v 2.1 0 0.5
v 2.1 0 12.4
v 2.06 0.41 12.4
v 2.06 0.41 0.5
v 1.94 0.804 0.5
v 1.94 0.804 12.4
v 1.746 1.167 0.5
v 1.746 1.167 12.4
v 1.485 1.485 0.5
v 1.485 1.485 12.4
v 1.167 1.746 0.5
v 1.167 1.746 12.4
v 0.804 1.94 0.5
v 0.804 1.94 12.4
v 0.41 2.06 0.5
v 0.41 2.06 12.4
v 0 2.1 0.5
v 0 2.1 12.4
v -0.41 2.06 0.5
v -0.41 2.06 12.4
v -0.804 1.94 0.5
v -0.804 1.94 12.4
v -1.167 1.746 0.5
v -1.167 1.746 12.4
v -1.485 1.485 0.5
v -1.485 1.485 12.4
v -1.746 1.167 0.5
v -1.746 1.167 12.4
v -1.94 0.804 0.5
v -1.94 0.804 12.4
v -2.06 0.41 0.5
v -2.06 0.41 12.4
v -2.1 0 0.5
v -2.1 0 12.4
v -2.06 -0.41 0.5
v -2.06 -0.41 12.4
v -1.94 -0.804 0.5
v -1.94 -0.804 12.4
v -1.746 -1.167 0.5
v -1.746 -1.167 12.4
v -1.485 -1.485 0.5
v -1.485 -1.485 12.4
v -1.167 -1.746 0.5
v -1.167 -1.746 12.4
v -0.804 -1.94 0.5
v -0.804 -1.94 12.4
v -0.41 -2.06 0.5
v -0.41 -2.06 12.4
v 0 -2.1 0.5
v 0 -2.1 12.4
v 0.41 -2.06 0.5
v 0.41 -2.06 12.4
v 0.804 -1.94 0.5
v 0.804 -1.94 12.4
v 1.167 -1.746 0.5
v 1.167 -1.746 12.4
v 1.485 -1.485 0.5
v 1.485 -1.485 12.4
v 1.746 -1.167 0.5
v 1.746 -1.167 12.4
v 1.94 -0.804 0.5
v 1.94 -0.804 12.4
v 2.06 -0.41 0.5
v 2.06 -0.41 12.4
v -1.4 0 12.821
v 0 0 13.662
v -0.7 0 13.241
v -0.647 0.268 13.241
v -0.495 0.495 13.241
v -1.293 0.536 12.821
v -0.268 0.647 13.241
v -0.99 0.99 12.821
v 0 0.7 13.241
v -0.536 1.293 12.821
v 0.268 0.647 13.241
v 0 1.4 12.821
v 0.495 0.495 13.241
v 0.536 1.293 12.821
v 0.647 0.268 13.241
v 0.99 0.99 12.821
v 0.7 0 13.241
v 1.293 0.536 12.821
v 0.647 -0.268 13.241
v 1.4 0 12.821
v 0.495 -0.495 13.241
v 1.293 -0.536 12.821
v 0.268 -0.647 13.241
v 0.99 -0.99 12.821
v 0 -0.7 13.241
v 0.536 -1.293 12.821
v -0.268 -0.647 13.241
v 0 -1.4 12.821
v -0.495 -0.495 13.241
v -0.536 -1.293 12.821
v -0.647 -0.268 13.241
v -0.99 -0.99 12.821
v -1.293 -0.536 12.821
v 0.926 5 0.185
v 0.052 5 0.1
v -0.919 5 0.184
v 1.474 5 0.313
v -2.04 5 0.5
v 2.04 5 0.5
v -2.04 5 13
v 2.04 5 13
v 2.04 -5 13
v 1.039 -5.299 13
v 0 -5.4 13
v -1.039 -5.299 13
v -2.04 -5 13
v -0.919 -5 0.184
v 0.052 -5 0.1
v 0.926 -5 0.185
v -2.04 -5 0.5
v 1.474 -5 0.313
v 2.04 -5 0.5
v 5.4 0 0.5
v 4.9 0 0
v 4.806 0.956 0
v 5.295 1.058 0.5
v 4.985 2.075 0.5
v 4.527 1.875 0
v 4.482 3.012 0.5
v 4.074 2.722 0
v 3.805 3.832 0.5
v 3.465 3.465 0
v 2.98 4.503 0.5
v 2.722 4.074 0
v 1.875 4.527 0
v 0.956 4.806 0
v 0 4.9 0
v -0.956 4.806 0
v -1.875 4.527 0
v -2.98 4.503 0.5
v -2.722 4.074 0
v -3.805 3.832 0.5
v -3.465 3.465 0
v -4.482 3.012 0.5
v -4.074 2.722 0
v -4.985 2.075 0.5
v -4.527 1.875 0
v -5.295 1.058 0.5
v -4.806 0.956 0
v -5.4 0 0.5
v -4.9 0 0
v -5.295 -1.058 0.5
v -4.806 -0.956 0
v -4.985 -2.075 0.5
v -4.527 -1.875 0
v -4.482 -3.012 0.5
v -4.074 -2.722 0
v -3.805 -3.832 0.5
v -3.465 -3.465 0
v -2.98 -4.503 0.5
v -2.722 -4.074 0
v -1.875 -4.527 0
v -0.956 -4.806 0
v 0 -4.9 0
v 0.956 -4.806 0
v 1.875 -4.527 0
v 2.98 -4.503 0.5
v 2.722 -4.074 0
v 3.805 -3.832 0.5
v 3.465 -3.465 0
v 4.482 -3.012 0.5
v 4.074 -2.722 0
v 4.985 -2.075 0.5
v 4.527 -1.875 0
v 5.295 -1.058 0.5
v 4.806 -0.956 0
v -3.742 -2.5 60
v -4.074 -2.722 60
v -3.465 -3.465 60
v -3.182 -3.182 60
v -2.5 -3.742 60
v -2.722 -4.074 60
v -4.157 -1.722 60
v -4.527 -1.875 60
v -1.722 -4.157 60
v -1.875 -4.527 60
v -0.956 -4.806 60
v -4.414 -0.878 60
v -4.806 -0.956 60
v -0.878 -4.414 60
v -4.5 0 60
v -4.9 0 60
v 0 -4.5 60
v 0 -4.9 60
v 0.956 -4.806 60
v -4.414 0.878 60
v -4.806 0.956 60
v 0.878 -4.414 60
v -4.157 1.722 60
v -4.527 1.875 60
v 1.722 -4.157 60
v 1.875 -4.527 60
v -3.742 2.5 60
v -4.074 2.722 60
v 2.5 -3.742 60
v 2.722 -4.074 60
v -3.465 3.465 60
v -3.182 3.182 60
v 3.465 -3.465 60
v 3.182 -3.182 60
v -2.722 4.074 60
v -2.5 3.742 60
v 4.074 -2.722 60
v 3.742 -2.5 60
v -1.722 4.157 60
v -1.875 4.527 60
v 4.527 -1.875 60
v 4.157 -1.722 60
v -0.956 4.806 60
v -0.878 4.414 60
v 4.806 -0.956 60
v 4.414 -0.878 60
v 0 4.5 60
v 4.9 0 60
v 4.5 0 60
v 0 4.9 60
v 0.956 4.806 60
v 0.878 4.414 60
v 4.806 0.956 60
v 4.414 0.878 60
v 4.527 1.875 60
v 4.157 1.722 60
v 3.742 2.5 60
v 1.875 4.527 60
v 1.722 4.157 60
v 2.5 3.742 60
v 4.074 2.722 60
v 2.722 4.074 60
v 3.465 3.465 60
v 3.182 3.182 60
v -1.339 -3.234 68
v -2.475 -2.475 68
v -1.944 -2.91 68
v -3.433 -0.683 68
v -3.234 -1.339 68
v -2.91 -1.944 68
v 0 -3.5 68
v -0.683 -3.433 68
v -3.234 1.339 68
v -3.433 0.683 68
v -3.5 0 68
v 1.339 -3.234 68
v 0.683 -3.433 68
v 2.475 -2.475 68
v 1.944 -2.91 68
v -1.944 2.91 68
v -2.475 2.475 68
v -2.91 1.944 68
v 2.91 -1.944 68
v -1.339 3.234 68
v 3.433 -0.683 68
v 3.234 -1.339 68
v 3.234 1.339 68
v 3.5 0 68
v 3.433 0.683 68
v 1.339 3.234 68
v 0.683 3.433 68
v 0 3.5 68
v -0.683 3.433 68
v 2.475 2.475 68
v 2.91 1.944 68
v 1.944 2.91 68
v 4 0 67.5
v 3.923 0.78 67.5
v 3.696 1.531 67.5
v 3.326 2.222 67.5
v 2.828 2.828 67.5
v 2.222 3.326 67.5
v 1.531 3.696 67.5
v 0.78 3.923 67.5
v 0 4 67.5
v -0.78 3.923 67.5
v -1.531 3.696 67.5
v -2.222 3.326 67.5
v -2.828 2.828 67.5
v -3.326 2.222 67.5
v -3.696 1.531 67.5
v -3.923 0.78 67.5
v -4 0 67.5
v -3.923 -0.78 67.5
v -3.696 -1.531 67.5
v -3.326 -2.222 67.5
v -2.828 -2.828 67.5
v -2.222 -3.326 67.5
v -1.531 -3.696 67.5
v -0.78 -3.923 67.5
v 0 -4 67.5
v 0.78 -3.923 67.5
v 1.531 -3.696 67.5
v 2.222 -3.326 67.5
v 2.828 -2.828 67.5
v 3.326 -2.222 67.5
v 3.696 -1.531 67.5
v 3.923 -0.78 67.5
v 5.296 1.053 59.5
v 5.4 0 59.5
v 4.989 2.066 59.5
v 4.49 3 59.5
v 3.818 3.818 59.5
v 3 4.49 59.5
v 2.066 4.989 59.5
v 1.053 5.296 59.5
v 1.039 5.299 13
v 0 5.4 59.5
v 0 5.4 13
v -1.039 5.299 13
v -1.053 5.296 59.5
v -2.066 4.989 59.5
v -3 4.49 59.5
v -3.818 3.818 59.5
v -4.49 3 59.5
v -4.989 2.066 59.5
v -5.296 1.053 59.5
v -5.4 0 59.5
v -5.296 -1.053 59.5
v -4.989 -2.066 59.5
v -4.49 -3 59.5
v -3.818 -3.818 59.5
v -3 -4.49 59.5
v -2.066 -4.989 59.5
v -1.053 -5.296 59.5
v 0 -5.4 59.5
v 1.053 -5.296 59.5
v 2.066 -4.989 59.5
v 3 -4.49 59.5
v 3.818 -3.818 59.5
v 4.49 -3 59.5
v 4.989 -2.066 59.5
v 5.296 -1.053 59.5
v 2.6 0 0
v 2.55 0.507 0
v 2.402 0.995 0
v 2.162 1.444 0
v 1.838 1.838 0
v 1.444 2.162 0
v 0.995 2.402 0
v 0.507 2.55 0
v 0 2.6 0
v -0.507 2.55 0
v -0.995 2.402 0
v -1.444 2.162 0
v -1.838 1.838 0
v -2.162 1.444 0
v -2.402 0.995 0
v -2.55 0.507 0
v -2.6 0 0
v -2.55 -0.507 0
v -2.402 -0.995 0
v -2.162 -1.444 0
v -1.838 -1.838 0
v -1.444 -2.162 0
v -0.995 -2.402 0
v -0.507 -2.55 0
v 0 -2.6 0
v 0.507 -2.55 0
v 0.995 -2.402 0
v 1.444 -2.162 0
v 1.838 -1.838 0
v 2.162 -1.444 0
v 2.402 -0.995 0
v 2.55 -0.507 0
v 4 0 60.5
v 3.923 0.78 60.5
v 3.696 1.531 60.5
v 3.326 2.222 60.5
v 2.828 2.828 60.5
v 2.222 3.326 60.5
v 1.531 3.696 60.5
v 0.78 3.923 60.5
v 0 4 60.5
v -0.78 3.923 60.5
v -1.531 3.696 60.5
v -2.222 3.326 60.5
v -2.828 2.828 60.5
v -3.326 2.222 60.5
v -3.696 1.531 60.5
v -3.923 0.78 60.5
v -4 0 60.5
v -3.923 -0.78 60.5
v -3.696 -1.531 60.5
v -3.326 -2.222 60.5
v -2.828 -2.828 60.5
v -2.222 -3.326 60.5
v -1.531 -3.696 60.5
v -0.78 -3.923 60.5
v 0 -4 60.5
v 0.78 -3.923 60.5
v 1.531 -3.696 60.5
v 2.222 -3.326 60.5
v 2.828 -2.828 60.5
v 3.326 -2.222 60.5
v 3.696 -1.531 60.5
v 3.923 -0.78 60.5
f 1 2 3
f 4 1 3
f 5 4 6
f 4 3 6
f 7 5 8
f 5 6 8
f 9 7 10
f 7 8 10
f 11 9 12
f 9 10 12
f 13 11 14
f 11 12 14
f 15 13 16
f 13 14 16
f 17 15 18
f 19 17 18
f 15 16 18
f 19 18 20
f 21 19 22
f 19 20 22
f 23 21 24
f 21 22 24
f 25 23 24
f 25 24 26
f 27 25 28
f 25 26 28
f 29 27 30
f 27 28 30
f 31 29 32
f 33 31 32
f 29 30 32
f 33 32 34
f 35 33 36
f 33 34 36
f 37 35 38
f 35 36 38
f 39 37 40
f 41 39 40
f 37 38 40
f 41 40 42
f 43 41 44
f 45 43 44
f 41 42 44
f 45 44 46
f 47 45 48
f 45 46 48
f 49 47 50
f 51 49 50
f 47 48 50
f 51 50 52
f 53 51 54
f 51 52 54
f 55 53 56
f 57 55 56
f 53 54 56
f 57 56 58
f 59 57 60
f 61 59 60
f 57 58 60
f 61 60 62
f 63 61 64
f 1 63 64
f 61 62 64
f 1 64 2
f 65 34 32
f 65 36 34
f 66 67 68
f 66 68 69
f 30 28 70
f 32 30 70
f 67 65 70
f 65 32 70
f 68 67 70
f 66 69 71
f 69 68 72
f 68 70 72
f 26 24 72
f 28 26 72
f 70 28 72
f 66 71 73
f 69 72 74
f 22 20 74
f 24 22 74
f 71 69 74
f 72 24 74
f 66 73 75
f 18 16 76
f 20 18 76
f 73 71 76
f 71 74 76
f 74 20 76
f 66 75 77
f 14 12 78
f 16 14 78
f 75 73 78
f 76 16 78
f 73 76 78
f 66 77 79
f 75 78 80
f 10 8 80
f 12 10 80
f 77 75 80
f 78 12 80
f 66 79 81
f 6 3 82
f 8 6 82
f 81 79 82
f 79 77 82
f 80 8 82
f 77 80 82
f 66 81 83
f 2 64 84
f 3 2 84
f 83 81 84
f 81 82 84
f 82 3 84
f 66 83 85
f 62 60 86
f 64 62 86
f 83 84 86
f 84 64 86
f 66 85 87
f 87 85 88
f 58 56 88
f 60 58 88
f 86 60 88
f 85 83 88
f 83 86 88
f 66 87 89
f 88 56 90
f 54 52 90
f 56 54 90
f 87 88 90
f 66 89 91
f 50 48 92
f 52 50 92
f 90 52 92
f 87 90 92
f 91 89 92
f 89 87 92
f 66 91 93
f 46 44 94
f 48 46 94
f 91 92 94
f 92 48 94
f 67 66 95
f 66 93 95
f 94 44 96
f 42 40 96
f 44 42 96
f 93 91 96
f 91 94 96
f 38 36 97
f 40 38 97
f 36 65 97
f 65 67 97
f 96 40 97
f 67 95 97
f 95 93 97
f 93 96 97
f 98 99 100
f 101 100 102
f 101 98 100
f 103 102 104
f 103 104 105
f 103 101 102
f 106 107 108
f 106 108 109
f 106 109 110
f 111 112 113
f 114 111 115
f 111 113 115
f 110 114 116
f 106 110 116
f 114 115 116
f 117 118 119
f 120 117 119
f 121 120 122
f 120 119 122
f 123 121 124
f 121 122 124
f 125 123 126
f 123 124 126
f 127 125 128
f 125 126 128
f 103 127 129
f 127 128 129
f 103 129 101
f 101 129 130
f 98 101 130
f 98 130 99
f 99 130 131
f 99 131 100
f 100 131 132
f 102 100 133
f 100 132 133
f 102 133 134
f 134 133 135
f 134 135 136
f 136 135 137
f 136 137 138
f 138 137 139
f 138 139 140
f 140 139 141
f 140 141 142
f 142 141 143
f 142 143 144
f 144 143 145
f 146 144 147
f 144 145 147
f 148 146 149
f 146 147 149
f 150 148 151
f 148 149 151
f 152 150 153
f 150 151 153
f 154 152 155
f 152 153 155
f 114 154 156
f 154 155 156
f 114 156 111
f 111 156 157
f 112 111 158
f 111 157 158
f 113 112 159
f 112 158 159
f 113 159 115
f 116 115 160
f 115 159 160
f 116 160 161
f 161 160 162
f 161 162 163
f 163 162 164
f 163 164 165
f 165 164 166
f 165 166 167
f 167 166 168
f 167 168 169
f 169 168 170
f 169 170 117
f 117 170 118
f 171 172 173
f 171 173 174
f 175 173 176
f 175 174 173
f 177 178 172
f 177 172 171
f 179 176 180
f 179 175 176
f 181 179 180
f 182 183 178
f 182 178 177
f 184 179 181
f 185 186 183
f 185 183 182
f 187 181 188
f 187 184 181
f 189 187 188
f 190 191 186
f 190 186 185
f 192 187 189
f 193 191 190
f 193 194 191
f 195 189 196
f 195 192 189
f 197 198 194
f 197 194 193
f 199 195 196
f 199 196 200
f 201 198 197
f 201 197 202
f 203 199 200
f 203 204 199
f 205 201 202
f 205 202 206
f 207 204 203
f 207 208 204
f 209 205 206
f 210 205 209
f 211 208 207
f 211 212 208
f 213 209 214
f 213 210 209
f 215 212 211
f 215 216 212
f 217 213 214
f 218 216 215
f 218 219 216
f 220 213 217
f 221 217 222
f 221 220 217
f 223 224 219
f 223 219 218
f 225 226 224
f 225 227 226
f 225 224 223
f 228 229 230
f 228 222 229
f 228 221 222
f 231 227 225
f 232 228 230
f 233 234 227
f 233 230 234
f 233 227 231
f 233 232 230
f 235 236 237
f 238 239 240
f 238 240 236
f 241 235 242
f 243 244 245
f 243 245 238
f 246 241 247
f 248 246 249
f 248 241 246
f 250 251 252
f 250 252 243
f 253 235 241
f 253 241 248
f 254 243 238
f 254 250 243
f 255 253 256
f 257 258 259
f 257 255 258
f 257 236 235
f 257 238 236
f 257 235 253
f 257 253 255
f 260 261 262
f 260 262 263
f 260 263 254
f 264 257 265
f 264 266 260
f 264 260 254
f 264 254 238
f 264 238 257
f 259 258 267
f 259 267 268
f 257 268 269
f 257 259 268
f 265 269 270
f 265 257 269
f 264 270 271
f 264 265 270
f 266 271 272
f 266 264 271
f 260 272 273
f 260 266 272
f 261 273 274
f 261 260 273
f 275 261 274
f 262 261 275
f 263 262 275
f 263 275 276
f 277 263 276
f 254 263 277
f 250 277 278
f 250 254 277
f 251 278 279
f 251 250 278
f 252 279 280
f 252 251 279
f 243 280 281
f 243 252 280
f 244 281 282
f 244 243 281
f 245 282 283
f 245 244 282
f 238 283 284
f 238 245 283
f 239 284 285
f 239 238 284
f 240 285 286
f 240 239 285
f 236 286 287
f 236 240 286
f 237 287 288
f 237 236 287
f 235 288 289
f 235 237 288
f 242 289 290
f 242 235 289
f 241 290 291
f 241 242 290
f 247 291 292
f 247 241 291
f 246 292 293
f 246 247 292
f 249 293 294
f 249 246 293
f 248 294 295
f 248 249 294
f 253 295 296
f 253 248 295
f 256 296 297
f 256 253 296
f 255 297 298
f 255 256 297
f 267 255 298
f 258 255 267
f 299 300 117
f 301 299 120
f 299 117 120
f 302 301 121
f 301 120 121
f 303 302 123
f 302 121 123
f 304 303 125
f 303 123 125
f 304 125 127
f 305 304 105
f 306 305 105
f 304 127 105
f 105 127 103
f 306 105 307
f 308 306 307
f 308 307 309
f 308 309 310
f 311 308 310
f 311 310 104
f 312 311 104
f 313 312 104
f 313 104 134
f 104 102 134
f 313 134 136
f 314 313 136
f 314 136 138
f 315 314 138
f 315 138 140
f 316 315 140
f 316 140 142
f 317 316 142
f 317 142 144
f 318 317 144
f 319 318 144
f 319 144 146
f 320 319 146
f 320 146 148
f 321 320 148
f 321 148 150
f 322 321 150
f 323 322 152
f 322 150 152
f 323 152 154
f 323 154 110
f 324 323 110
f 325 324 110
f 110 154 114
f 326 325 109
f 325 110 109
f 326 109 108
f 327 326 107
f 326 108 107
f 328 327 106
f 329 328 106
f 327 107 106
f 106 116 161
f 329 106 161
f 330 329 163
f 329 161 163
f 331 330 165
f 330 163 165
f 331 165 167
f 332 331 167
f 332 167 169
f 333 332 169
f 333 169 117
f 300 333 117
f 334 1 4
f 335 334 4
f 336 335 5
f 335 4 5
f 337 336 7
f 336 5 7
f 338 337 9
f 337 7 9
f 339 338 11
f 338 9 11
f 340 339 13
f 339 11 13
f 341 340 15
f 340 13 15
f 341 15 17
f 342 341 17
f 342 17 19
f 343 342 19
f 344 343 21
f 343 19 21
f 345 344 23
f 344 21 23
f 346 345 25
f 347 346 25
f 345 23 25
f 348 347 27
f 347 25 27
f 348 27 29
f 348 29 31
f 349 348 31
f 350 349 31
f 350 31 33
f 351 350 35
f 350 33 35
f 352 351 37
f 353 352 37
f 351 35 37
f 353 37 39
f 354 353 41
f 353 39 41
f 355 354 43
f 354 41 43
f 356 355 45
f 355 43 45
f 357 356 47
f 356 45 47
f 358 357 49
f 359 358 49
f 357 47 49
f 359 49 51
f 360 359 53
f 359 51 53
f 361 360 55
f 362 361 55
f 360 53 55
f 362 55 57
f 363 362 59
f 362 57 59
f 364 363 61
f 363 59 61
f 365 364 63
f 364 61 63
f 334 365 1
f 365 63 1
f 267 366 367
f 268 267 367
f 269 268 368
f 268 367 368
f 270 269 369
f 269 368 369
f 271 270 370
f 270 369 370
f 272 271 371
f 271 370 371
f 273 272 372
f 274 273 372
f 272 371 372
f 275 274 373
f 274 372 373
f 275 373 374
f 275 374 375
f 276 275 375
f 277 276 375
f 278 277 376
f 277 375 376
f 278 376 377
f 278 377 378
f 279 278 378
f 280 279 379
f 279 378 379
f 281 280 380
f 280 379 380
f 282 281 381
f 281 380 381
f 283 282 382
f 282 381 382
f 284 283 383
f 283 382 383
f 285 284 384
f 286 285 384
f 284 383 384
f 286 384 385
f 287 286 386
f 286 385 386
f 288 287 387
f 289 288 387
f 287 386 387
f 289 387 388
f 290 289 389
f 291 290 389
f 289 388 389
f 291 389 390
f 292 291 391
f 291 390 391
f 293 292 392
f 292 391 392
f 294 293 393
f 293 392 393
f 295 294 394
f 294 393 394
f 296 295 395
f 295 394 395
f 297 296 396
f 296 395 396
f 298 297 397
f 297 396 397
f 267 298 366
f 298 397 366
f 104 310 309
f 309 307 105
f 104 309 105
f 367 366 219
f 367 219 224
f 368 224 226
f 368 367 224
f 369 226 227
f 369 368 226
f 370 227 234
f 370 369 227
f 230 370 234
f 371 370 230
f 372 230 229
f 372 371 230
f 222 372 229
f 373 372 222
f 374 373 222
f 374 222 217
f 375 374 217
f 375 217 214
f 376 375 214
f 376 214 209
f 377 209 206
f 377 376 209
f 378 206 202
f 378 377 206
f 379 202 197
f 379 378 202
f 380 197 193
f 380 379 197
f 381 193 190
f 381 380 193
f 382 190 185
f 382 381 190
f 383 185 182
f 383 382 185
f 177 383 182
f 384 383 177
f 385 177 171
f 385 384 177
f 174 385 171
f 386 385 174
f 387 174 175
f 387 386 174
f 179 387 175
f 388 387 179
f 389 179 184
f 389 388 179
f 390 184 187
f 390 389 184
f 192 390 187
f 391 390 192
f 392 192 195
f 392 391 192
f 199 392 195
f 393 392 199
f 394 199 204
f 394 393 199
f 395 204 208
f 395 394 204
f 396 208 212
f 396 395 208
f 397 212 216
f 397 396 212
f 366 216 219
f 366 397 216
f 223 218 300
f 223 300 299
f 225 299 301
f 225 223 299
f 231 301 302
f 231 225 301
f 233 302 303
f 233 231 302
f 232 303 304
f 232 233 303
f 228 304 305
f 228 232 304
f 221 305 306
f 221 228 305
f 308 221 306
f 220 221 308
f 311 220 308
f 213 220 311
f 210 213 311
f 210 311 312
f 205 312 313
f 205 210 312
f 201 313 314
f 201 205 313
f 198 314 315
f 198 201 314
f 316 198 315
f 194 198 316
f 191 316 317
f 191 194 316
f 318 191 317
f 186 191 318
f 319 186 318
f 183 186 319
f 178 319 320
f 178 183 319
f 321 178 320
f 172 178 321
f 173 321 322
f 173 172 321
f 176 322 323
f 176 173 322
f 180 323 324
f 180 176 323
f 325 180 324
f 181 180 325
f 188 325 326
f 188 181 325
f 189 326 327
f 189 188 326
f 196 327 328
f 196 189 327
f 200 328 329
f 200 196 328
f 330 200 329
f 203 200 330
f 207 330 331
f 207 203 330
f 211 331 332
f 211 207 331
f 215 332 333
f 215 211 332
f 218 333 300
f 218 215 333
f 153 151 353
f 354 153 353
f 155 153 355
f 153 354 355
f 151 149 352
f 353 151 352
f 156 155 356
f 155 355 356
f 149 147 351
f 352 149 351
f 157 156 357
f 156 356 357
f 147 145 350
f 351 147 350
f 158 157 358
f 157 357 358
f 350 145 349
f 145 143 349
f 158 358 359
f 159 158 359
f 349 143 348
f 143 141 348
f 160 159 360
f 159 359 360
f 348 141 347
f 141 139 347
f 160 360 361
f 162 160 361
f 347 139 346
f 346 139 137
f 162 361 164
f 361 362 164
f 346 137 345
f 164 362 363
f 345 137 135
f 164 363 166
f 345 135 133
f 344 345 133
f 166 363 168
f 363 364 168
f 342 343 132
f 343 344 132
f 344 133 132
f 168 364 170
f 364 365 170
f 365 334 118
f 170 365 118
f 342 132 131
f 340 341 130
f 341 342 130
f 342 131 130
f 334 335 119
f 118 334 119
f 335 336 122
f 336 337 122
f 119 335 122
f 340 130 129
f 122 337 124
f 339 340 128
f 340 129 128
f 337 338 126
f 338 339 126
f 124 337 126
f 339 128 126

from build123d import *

# Parameters (mm, degrees)
SKETCH_1_R             = 5.4
EXTRUDE_1_DEPTH        = 60
CHAMFER_1_SIZE         = 0.5
SKETCH_2_R             = 4
EXTRUDE_2_DEPTH        = 8
CHAMFER_2_SIZE         = 0.5
HOLE_WIZARD_M5_1_D     = 4.2
HOLE_WIZARD_M5_1_DEPTH = 12.4
HOLE_WIZARD_M5_1_TIP   = 1.2618073
CHAMFER_3_SIZE         = 0.5
SKETCH_5_W             = 10
SKETCH_5_H             = 3
CUT_EXTRUDE_3_DEPTH    = 13
CHAMFER_4_SIZE         = 0.5


with BuildPart() as part:
    # 草图1 → 拉伸1 (new body)
    with BuildSketch(Plane.XY):
        Circle(SKETCH_1_R)
    extrude(amount=EXTRUDE_1_DEPTH)

    # 倒角1
    chamfer_1_edges = [part.edges().sort_by_distance(p)[0] for p in [
        (-5.4, 0, 0),
        (-5.4, 0, 60),
    ]]
    chamfer(chamfer_1_edges, length=CHAMFER_1_SIZE)

    # 草图2 → 拉伸2 (add)
    with BuildSketch(Plane.XY.offset(60)):
        Circle(SKETCH_2_R)
    extrude(amount=EXTRUDE_2_DEPTH)

    # 倒角2
    chamfer_2_edges = [part.edges().sort_by_distance(p)[0] for p in [
        (-4, 0, 68),
    ]]
    chamfer(chamfer_2_edges, length=CHAMFER_2_SIZE)

    # M5 螺纹孔1
    with Locations(Plane(origin=(0, 0, 0), x_dir=(-1, 0, 0), z_dir=(0, 0, -1))):
        with Locations((0, 0)):
            Hole(HOLE_WIZARD_M5_1_D / 2, depth=HOLE_WIZARD_M5_1_DEPTH)
            with Locations((0, 0, -(HOLE_WIZARD_M5_1_DEPTH + HOLE_WIZARD_M5_1_TIP / 2))):  # 118° drill point
                Cone(0, HOLE_WIZARD_M5_1_D / 2, HOLE_WIZARD_M5_1_TIP, mode=Mode.SUBTRACT)

    # 倒角3
    chamfer_3_edges = [part.edges().sort_by_distance(p)[0] for p in [
        (-2.1, 0, 0),
    ]]
    chamfer(chamfer_3_edges, length=CHAMFER_3_SIZE)

    # 草图5 → 拉伸3 (cut)
    with BuildSketch(Plane.XY):
        with Locations((0, 6.5)):
            Rectangle(SKETCH_5_W, SKETCH_5_H)
    cut_extrude_3 = extrude(amount=CUT_EXTRUDE_3_DEPTH, mode=Mode.SUBTRACT)

    # 镜向1: 拉伸3 across plane
    add(cut_extrude_3.mirror(Plane.ZX), mode=Mode.SUBTRACT)

    # 倒角4
    chamfer_4_edges = [part.edges().sort_by_distance(p)[0] for p in [
        (-4, 0, 60),
    ]]
    chamfer(chamfer_4_edges, length=CHAMFER_4_SIZE)


solid = part.part
